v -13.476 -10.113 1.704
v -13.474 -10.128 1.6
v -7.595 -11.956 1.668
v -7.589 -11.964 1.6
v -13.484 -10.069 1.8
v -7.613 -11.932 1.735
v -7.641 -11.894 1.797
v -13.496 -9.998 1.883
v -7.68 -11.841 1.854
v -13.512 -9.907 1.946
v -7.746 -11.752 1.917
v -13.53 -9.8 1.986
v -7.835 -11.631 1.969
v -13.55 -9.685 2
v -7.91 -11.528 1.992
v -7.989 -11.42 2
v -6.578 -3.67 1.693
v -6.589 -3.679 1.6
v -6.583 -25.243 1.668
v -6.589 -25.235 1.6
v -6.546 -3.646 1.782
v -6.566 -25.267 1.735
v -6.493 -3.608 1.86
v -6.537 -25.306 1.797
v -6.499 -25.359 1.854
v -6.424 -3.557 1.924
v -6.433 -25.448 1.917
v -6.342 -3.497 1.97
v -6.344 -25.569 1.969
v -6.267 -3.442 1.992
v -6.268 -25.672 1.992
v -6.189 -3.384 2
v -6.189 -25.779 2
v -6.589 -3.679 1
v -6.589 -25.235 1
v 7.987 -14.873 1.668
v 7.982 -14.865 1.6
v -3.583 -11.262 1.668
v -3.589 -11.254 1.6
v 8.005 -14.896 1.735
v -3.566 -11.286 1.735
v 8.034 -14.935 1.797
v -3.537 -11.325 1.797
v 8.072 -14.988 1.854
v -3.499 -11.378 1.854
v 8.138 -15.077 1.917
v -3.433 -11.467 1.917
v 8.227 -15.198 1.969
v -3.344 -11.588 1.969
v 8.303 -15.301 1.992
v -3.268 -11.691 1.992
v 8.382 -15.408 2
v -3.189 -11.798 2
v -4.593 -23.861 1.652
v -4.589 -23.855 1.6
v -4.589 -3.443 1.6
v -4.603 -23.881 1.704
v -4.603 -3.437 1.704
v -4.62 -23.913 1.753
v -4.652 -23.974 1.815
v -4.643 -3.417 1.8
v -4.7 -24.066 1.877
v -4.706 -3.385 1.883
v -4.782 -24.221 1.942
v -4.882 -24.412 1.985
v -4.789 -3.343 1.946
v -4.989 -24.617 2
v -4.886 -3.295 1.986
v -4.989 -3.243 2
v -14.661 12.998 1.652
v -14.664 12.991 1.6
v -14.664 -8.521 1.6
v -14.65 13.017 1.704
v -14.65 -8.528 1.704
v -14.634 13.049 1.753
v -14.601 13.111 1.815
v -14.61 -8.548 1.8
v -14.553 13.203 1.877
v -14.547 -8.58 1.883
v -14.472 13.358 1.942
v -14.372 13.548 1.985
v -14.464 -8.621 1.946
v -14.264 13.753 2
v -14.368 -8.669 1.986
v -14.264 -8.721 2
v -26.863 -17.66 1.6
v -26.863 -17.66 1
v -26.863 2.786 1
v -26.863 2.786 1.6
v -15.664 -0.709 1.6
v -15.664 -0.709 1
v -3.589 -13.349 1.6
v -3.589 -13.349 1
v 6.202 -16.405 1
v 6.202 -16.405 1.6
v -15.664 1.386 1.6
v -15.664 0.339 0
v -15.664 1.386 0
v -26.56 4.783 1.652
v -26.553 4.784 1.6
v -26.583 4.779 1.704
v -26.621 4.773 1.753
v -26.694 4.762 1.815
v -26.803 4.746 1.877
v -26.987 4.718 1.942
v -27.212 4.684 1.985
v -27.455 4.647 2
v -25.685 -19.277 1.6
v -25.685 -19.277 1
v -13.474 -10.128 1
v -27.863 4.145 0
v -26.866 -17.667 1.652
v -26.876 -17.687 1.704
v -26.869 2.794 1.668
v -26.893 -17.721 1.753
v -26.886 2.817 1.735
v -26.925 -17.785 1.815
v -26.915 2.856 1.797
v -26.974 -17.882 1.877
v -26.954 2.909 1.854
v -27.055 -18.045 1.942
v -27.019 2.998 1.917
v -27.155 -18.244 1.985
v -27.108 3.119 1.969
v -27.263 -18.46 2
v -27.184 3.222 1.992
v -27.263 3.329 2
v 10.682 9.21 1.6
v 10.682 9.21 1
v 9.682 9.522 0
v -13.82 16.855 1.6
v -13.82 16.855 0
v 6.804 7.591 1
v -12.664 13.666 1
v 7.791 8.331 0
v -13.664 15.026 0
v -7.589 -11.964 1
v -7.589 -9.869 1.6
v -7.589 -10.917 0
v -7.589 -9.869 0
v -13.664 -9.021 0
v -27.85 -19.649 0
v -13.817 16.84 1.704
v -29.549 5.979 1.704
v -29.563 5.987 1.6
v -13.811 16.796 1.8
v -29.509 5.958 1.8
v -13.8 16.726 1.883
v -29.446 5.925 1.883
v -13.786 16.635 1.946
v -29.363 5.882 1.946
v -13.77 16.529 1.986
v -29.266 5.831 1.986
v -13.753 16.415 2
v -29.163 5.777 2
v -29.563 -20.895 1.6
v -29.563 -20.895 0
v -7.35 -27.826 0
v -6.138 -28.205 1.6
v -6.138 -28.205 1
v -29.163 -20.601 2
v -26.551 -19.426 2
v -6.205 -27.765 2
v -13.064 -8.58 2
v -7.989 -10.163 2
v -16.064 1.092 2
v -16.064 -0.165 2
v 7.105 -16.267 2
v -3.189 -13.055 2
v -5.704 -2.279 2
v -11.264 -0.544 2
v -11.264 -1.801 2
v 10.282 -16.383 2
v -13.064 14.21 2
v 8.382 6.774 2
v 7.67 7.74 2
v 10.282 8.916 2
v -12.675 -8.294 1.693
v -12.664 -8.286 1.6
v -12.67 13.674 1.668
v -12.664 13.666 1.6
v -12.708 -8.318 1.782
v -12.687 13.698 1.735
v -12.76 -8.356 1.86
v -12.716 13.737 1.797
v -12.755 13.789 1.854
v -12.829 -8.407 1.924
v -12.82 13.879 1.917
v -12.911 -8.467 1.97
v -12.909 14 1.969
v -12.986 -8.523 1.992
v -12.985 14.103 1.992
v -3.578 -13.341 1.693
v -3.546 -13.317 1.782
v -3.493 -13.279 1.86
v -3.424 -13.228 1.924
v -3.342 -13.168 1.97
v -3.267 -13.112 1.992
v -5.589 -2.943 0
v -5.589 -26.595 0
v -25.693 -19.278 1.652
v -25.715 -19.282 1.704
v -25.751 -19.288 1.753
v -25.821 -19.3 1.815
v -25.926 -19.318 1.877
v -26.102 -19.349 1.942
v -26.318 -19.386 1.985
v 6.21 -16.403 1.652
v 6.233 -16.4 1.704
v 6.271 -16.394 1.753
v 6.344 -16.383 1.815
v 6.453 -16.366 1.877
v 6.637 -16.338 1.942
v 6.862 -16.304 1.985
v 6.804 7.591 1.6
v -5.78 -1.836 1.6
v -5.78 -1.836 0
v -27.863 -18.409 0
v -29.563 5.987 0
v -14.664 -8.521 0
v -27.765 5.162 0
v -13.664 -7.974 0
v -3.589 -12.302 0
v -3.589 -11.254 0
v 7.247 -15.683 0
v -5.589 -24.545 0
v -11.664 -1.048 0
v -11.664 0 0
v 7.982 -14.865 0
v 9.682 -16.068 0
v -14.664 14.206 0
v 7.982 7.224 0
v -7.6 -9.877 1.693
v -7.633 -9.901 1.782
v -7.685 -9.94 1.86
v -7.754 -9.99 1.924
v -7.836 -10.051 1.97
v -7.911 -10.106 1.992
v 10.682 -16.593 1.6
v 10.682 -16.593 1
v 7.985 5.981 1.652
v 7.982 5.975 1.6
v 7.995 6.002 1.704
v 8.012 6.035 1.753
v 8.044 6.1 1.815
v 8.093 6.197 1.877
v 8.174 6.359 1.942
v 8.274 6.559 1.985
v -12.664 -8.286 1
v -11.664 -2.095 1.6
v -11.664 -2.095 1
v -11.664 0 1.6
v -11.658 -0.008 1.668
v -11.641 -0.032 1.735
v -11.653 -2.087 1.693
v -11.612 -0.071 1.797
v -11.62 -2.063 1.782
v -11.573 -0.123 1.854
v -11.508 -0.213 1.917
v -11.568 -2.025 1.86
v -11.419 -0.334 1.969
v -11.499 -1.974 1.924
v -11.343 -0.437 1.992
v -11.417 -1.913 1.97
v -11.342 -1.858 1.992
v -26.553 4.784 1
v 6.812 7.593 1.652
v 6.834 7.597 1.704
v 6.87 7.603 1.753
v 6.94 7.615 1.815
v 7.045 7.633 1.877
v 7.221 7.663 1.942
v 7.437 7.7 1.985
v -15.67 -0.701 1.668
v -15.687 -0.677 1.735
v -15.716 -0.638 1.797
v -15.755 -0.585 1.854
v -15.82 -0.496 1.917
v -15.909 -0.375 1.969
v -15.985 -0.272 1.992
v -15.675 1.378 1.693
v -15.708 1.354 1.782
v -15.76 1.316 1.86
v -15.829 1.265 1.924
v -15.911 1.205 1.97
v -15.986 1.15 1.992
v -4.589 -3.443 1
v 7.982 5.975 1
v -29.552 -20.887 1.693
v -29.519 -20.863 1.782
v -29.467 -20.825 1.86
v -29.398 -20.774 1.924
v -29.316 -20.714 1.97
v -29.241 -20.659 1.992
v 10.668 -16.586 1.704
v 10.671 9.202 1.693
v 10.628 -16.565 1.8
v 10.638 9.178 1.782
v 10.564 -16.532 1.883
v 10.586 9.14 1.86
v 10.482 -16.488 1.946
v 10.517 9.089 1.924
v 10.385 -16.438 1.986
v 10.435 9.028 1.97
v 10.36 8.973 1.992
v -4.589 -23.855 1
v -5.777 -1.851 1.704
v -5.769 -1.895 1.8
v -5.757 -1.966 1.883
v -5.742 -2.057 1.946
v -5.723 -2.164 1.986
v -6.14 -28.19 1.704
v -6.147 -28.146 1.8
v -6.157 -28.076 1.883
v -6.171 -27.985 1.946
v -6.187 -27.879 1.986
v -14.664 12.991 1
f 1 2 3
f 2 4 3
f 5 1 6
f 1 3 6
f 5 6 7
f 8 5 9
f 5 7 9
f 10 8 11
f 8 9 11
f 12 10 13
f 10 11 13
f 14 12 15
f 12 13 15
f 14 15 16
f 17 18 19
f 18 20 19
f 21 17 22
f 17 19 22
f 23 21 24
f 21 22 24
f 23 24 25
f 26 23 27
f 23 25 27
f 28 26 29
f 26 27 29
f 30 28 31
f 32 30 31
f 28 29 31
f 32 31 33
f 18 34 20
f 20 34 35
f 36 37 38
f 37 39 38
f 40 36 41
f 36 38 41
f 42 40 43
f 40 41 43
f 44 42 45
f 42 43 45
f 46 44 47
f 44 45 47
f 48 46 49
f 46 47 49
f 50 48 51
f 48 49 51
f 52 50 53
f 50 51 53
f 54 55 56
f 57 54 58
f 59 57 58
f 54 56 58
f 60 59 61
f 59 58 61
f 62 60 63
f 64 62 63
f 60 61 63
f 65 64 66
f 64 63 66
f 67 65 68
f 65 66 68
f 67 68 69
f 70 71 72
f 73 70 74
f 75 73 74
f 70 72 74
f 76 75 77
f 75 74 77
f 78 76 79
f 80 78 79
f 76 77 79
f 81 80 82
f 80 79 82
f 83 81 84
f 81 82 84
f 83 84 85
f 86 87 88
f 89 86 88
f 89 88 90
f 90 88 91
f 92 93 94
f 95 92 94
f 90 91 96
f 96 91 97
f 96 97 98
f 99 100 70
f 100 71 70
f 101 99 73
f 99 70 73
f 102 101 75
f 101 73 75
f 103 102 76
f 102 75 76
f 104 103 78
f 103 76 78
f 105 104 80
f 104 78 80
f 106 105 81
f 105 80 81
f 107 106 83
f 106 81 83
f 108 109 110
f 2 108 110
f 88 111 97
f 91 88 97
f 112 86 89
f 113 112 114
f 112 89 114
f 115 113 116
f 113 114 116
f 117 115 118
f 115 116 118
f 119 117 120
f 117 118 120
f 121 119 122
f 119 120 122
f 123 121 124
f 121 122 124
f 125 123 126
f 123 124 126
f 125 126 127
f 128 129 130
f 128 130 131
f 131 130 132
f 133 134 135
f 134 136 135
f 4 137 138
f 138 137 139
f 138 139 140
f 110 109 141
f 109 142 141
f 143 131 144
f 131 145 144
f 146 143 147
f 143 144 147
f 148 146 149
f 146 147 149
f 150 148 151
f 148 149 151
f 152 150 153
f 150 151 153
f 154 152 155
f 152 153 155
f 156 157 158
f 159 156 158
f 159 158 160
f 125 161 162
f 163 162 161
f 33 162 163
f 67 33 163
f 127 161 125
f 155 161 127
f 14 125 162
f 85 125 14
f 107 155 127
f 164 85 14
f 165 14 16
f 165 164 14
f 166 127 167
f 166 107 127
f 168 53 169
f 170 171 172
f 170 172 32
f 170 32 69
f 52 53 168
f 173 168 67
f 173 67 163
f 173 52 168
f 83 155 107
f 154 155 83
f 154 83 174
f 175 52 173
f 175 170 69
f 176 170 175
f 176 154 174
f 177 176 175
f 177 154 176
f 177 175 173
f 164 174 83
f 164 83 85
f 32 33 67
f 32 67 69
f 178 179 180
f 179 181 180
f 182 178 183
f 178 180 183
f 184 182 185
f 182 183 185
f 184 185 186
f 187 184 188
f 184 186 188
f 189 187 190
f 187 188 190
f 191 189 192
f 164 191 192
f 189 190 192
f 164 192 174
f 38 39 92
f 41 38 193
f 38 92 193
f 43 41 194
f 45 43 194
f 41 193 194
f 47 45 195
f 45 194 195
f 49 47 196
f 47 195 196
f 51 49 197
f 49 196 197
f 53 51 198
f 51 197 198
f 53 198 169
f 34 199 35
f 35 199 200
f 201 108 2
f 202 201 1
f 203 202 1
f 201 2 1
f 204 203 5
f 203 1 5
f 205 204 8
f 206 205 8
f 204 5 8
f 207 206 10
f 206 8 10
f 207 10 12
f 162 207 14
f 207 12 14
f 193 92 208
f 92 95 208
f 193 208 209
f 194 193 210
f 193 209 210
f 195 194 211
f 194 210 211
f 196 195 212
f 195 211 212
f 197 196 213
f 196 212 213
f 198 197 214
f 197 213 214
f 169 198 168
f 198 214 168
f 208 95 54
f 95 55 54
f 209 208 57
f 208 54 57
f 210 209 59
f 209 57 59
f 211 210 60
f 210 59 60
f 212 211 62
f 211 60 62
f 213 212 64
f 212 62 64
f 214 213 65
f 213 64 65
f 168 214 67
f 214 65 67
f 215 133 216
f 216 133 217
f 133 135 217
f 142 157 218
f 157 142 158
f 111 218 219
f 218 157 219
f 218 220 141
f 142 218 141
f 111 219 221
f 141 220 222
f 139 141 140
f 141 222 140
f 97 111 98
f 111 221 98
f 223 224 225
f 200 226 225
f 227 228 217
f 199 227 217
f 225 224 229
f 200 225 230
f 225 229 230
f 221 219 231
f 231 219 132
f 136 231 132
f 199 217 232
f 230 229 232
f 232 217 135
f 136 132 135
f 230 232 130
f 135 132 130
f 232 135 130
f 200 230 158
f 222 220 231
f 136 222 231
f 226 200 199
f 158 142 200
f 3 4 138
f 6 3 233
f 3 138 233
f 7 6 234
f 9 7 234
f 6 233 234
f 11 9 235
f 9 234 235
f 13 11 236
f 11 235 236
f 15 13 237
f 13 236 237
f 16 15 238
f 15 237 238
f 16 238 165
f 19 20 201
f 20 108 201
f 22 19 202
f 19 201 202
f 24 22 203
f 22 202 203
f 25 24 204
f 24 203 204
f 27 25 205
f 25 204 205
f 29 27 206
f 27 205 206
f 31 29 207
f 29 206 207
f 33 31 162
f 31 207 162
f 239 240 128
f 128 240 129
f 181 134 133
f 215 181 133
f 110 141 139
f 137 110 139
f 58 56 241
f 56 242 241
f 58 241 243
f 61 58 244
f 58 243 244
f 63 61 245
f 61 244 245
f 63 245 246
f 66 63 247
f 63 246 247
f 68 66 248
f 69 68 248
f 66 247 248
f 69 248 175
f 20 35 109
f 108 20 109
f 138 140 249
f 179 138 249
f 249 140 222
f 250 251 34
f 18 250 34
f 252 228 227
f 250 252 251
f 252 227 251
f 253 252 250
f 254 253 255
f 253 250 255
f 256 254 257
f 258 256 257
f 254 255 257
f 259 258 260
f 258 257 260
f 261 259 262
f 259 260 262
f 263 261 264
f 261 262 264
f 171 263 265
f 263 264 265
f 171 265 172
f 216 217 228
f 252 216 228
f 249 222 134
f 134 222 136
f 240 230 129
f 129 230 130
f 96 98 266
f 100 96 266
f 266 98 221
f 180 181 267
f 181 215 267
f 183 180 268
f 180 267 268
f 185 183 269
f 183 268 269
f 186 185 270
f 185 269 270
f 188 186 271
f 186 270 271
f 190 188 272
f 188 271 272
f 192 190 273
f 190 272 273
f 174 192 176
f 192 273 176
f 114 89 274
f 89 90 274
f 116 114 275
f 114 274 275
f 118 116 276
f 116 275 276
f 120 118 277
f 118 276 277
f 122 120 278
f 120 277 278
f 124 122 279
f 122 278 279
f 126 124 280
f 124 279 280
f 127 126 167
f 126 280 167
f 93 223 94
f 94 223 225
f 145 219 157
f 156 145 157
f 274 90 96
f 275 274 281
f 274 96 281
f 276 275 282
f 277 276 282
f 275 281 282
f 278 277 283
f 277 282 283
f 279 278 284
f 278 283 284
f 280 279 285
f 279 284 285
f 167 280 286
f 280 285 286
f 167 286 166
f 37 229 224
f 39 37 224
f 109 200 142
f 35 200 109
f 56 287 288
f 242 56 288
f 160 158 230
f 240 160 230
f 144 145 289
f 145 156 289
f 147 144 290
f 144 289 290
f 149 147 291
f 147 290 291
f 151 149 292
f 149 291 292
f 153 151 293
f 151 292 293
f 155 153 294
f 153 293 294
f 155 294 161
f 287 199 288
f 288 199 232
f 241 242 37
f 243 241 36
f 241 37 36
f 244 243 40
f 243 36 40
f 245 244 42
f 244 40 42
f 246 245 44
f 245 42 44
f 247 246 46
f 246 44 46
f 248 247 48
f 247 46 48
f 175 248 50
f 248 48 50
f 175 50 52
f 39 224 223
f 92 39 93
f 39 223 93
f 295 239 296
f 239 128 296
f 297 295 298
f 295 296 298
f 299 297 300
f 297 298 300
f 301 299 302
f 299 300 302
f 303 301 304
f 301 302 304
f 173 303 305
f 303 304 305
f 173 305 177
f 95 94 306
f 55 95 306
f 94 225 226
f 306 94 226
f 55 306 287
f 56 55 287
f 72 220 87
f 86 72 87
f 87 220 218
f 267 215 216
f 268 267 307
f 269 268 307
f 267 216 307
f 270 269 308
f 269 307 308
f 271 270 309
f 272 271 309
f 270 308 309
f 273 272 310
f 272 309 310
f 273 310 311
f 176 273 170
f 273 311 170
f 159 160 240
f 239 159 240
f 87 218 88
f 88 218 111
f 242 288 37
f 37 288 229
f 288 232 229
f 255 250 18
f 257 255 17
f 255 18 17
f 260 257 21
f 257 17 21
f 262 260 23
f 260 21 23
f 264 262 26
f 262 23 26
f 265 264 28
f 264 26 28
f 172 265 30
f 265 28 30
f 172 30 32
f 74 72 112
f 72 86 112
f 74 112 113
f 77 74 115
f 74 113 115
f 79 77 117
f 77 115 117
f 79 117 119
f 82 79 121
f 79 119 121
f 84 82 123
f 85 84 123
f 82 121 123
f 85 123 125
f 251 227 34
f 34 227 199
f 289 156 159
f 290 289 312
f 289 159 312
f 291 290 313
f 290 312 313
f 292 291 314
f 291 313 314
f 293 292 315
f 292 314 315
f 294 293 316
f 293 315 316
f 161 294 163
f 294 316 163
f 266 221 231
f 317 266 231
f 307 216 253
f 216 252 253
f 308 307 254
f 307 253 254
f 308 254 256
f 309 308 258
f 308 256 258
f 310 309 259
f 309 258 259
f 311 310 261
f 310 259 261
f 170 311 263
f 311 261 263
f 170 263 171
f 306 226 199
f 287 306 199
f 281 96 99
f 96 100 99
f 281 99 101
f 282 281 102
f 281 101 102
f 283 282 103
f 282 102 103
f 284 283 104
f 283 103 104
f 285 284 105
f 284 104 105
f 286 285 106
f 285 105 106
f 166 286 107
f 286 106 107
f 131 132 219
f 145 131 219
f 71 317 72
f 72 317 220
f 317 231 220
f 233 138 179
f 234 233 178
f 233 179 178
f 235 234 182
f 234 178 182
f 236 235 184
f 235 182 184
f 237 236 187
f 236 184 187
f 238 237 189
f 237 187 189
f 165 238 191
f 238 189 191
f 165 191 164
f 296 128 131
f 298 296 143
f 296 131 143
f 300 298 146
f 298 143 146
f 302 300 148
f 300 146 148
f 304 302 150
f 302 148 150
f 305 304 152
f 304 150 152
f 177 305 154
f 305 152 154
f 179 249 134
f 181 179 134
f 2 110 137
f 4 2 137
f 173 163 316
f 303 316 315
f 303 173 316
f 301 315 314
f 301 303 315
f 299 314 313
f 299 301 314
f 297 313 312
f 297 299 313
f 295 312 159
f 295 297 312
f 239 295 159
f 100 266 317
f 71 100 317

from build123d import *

# Parameters (mm, degrees)
F1_DEPTH = 2
F2_SIZE  = 0.99999
F3_R     = 0.4


# Not quite as in the source:
# - a fillet or chamfer is up to 0.001 mm smaller than in the source, because OpenCascade refuses the exact size
# - a feature names something its author has since deleted; it is built from what else it names


with BuildPart() as f1:
    # F0 (on Top) → F1 (new body)
    with BuildSketch(Plane.XY):
        Polygon((-13.8196714956, 16.8550248196), (-29.5628140081, 5.986613122), (-29.5628140081, -20.895469086), (-6.1378714726, -28.2046662626), (10.6815792442, -16.5932160853), (10.6815792442, 9.2099912209), align=None)
        Polygon((-5.5893215574, -24.5450593134), (-6.5893215574, -25.2354177783), (-25.6853743411, -19.2769478747), (-26.8628140101, -18.9095557801), (-26.8628140101, -17.6600457129), (-26.8628140101, 2.7856210558), (-26.8628140101, 4.569670104), (-26.5525036512, 4.783895487), (-14.6640113722, 12.9912167666), (-13.6640113722, 13.6815752315), (-13.3682214107, 13.8857763353), (-12.6640113722, 13.6660443117), (6.8041395773, 7.5914700096), (7.9815792463, 7.224077915), (7.9815792463, 5.9745678478), (7.9815792463, -14.864596124), (7.9815792463, -15.1762730673), (7.5702731242, -15.4602217303), (6.2023996294, -16.4045447763), (-4.5893215574, -23.8547008485), align=None, mode=Mode.SUBTRACT)
        Polygon((-26.8628140101, 4.569670104), (-26.8628140101, 2.7856210558), (-15.6640113722, -0.7086994318), (-15.6640113722, 1.3863999797), (-26.5525036512, 4.783895487), align=None)
        with BuildLine():
            Line((-13.6640113722, 13.6815752315), (-13.6640113722, -8.0212351043))
            ThreePointArc((-13.6640113722, -8.0212351043), (-13.5133605177, -8.0326480722), (-13.3661484098, -8.0666264642))
            Line((-13.3661484098, -8.0666264642), (-12.6640113722, -8.2857116571))
            Line((-12.6640113722, -8.2857116571), (-12.6640113722, 13.6660443117))
            Line((-12.6640113722, 13.6660443117), (-13.3682214107, 13.8857763353))
            Line((-13.3682214107, 13.8857763353), (-13.6640113722, 13.6815752315))
        make_face()
        with BuildLine():
            Line((-14.6640113722, 12.9912167666), (-14.6640113722, -8.5209081976))
            Line((-14.6640113722, -8.5209081976), (-14.2635929044, -8.2209214243))
            ThreePointArc((-14.2635929044, -8.2209214243), (-13.9799910551, -8.0724691479), (-13.6640113722, -8.0212351043))
            Line((-13.6640113722, -8.0212351043), (-13.6640113722, 13.6815752315))
            Line((-13.6640113722, 13.6815752315), (-14.6640113722, 12.9912167666))
        make_face()
        with BuildLine():
            Line((-6.5893215574, -3.6785358878), (-6.5893215574, -25.2354177783))
            Line((-6.5893215574, -25.2354177783), (-5.5893215574, -24.5450593134))
            Line((-5.5893215574, -24.5450593134), (-5.5893215574, -3.9430124406))
            ThreePointArc((-5.5893215574, -3.9430124406), (-5.739972412, -3.9315994727), (-5.8871845198, -3.8976210807))
            Line((-5.8871845198, -3.8976210807), (-6.5893215574, -3.6785358878))
        make_face()
        with BuildLine():
            Line((-5.5893215574, -3.9430124406), (-5.5893215574, -24.5450593134))
            Line((-5.5893215574, -24.5450593134), (-4.5893215574, -23.8547008485))
            Line((-4.5893215574, -23.8547008485), (-4.5893215574, -3.4433393473))
            Line((-4.5893215574, -3.4433393473), (-4.9897400253, -3.7433261206))
            ThreePointArc((-4.9897400253, -3.7433261206), (-5.2733418745, -3.891778397), (-5.5893215574, -3.9430124406))
        make_face()
        with BuildLine():
            ThreePointArc((-5.2914585951, -1.9884038006), (-5.0122521974, -2.1263172994), (-4.7890078775, -2.3434309085))
            Line((-4.7890078775, -2.3434309085), (7.9815792463, 7.224077915))
            Line((7.9815792463, 7.224077915), (6.8041395773, 7.5914700096))
            Line((6.8041395773, 7.5914700096), (-5.7796330622, -1.8360805481))
            Line((-5.7796330622, -1.8360805481), (-5.2914585951, -1.9884038006))
        make_face()
        with BuildLine():
            Line((-4.5893215574, -2.9430124406), (-4.5893215574, -3.4433393473))
            Line((-4.5893215574, -3.4433393473), (7.9815792463, 5.9745678478))
            Line((7.9815792463, 5.9745678478), (7.9815792463, 7.224077915))
            Line((7.9815792463, 7.224077915), (-4.7890078775, -2.3434309085))
            ThreePointArc((-4.7890078775, -2.3434309085), (-4.6405556011, -2.6270327577), (-4.5893215574, -2.9430124406))
        make_face()
        with BuildLine():
            Line((-26.8628140101, -18.9095557801), (-25.6853743411, -19.2769478747))
            Line((-25.6853743411, -19.2769478747), (-13.4736998674, -10.1281669968))
            Line((-13.4736998674, -10.1281669968), (-13.9618743346, -9.9758437443))
            ThreePointArc((-13.9618743346, -9.9758437443), (-14.2410807322, -9.8379302455), (-14.4643250521, -9.6208166364))
            Line((-14.4643250521, -9.6208166364), (-26.8628140101, -18.9095557801))
        make_face()
        with BuildLine():
            Line((-26.8628140101, -17.6600457129), (-26.8628140101, -18.9095557801))
            Line((-26.8628140101, -18.9095557801), (-14.4643250521, -9.6208166364))
            ThreePointArc((-14.4643250521, -9.6208166364), (-14.6127773286, -9.3372147872), (-14.6640113722, -9.0212351043))
            Line((-14.6640113722, -9.0212351043), (-14.6640113722, -8.5209081976))
            Line((-14.6640113722, -8.5209081976), (-26.8628140101, -17.6600457129))
        make_face()
        Polygon((-3.5893215574, -13.3492706494), (6.2023996294, -16.4045447763), (7.5702731242, -15.4602217303), (-3.5893215574, -11.9781351546), align=None)
        with BuildLine():
            Line((-11.6640113722, -2.0950994115), (-6.5893215574, -3.6785358878))
            Line((-6.5893215574, -3.6785358878), (-6.5893215574, -2.9430124406))
            ThreePointArc((-6.5893215574, -2.9430124406), (-6.4836317755, -2.4955649757), (-6.1889030896, -2.1426987607))
            Line((-6.1889030896, -2.1426987607), (-5.7796330622, -1.8360805481))
            Line((-5.7796330622, -1.8360805481), (-11.6640113722, 0))
            Line((-11.6640113722, 0), (-11.6640113722, -2.0950994115))
        make_face()
        with BuildLine():
            Line((-13.06442984, -9.8215487842), (-13.4736998674, -10.1281669968))
            Line((-13.4736998674, -10.1281669968), (-7.5893215574, -11.9642475449))
            Line((-7.5893215574, -11.9642475449), (-7.5893215574, -9.8691481334))
            Line((-7.5893215574, -9.8691481334), (-12.6640113722, -8.2857116571))
            Line((-12.6640113722, -8.2857116571), (-12.6640113722, -9.0212351043))
            ThreePointArc((-12.6640113722, -9.0212351043), (-12.7697011542, -9.4686825693), (-13.06442984, -9.8215487842))
        make_face()
        Polygon((-3.5893215574, -11.9781351546), (7.5702731242, -15.4602217303), (7.9815792463, -15.1762730673), (7.9815792463, -14.864596124), (-3.5893215574, -11.2541712379), align=None)
        with BuildLine():
            ThreePointArc((-5.8871845198, -3.8976210807), (-5.739972412, -3.9315994727), (-5.5893215574, -3.9430124406))
            Line((-5.5893215574, -3.9430124406), (-5.5893215574, -2.9430124406))
            Line((-5.5893215574, -2.9430124406), (-4.7890078775, -2.3434309085))
            ThreePointArc((-4.7890078775, -2.3434309085), (-5.0122521974, -2.1263172994), (-5.2914585951, -1.9884038006))
            ThreePointArc((-5.2914585951, -1.9884038006), (-5.7587625723, -1.9574721104), (-6.1889030896, -2.1426987607))
            ThreePointArc((-6.1889030896, -2.1426987607), (-6.4836317755, -2.4955649757), (-6.5893215574, -2.9430124406))
            ThreePointArc((-6.5893215574, -2.9430124406), (-6.3948843925, -3.535522794), (-5.8871845198, -3.8976210807))
        make_face()
        with BuildLine():
            Line((-13.6640113722, -9.0212351043), (-14.4643250521, -9.6208166364))
            ThreePointArc((-14.4643250521, -9.6208166364), (-14.2410807322, -9.8379302455), (-13.9618743346, -9.9758437443))
            ThreePointArc((-13.9618743346, -9.9758437443), (-13.4945703573, -10.0067754345), (-13.06442984, -9.8215487842))
            ThreePointArc((-13.06442984, -9.8215487842), (-12.7697011542, -9.4686825693), (-12.6640113722, -9.0212351043))
            ThreePointArc((-12.6640113722, -9.0212351043), (-12.8584485372, -8.4287247509), (-13.3661484098, -8.0666264642))
            ThreePointArc((-13.3661484098, -8.0666264642), (-13.5133605177, -8.0326480722), (-13.6640113722, -8.0212351043))
            Line((-13.6640113722, -8.0212351043), (-13.6640113722, -9.0212351043))
        make_face()
        with BuildLine():
            Line((-5.5893215574, -2.9430124406), (-5.5893215574, -3.9430124406))
            ThreePointArc((-5.5893215574, -3.9430124406), (-5.2733418745, -3.891778397), (-4.9897400253, -3.7433261206))
            ThreePointArc((-4.9897400253, -3.7433261206), (-4.6950113394, -3.3904599056), (-4.5893215574, -2.9430124406))
            ThreePointArc((-4.5893215574, -2.9430124406), (-4.6405556011, -2.6270327577), (-4.7890078775, -2.3434309085))
            Line((-4.7890078775, -2.3434309085), (-5.5893215574, -2.9430124406))
        make_face()
        with BuildLine():
            ThreePointArc((-14.6640113722, -9.0212351043), (-14.6127773286, -9.3372147872), (-14.4643250521, -9.6208166364))
            Line((-14.4643250521, -9.6208166364), (-13.6640113722, -9.0212351043))
            Line((-13.6640113722, -9.0212351043), (-13.6640113722, -8.0212351043))
            ThreePointArc((-13.6640113722, -8.0212351043), (-13.9799910551, -8.0724691479), (-14.2635929044, -8.2209214243))
            ThreePointArc((-14.2635929044, -8.2209214243), (-14.5583215902, -8.5737876393), (-14.6640113722, -9.0212351043))
        make_face()
        with BuildLine():
            Line((-6.5893215574, -2.9430124406), (-6.5893215574, -3.6785358878))
            Line((-6.5893215574, -3.6785358878), (-5.8871845198, -3.8976210807))
            ThreePointArc((-5.8871845198, -3.8976210807), (-6.3948843925, -3.535522794), (-6.5893215574, -2.9430124406))
        make_face()
        with BuildLine():
            ThreePointArc((-13.3661484098, -8.0666264642), (-12.8584485372, -8.4287247509), (-12.6640113722, -9.0212351043))
            Line((-12.6640113722, -9.0212351043), (-12.6640113722, -8.2857116571))
            Line((-12.6640113722, -8.2857116571), (-13.3661484098, -8.0666264642))
        make_face()
        with BuildLine():
            Line((-13.9618743346, -9.9758437443), (-13.4736998674, -10.1281669968))
            Line((-13.4736998674, -10.1281669968), (-13.06442984, -9.8215487842))
            ThreePointArc((-13.06442984, -9.8215487842), (-13.4945703573, -10.0067754345), (-13.9618743346, -9.9758437443))
        make_face()
        with BuildLine():
            Line((-5.7796330622, -1.8360805481), (-6.1889030896, -2.1426987607))
            ThreePointArc((-6.1889030896, -2.1426987607), (-5.7587625723, -1.9574721104), (-5.2914585951, -1.9884038006))
            Line((-5.2914585951, -1.9884038006), (-5.7796330622, -1.8360805481))
        make_face()
        with BuildLine():
            Line((-4.9897400253, -3.7433261206), (-4.5893215574, -3.4433393473))
            Line((-4.5893215574, -3.4433393473), (-4.5893215574, -2.9430124406))
            ThreePointArc((-4.5893215574, -2.9430124406), (-4.6950113394, -3.3904599056), (-4.9897400253, -3.7433261206))
        make_face()
        with BuildLine():
            Line((-14.2635929044, -8.2209214243), (-14.6640113722, -8.5209081976))
            Line((-14.6640113722, -8.5209081976), (-14.6640113722, -9.0212351043))
            ThreePointArc((-14.6640113722, -9.0212351043), (-14.5583215902, -8.5737876393), (-14.2635929044, -8.2209214243))
        make_face()
    extrude(amount=F1_DEPTH)

    # F2 (size 1 in the source; OpenCascade refuses exactly that, so slightly less here)
    f2_edges = [f1.edges().sort_by_distance(p)[0] for p in [
        (-6.589322, -14.456977, 0),
        (-12.664011, 2.690166, 0),
        (-20.608258, 8.887556, 0),
        (-26.862814, -7.437212, 0),
        (-21.263413, 1.038461, 0),
        (-19.579537, -14.702557, 0),
        (1.306539, -14.876908, 0),
        (-10.531511, -11.046207, 0),
        (-9.126666, -2.886818, 0),
        (-4.589322, -13.64902, 0),
        (1.696129, 1.265614, 0),
        (10.681579, -3.691612, 0),
        (-2.929936, 10.628757, 0),
        (2.271854, -22.398941, 0),
        (-16.137348, -22.256183, 0),
    ]]
    chamfer(f2_edges, length=F2_SIZE)

    # F3
    f3_edges = [f1.edges().sort_by_distance(p)[0] for p in [
        (-17.850343, -24.550068, 2),
        (2.271854, -22.398941, 2),
        (10.681579, -3.691612, 2),
        (-1.569046, 13.032508, 2),
        (-21.691243, 11.420819, 2),
        (-29.562814, -7.454428, 2),
        (7.981579, -4.445014, 2),
        (0.806539, -20.129623, 2),
        (-16.137348, -22.256183, 2),
        (-26.862814, -7.437212, 2),
        (-21.263413, 1.038461, 2),
        (-21.108258, 3.085148, 2),
        (-14.664011, 2.235154, 2),
        (-12.664011, 2.690166, 2),
        (1.696129, 1.265614, 2),
        (0.512253, 2.877695, 2),
        (-4.589322, -13.64902, 2),
        (2.196129, -13.059384, 2),
        (-3.589322, -12.301721, 2),
        (1.306539, -14.876908, 2),
        (-20.763413, -13.090477, 2),
        (-15.664011, 0.33885, 2),
        (-20.608258, 8.887556, 2),
        (-8.721822, -0.91804, 2),
        (-11.664011, -1.04755, 2),
        (-9.126666, -2.886818, 2),
        (-6.589322, -14.456977, 2),
        (-19.579537, -14.702557, 2),
        (-10.531511, -11.046207, 2),
        (-7.589322, -10.916698, 2),
        (-10.126666, -9.07743, 2),
        (-2.929936, 10.628757, 2),
    ]]
    fillet(f3_edges, radius=F3_R)


solid = f1.part
